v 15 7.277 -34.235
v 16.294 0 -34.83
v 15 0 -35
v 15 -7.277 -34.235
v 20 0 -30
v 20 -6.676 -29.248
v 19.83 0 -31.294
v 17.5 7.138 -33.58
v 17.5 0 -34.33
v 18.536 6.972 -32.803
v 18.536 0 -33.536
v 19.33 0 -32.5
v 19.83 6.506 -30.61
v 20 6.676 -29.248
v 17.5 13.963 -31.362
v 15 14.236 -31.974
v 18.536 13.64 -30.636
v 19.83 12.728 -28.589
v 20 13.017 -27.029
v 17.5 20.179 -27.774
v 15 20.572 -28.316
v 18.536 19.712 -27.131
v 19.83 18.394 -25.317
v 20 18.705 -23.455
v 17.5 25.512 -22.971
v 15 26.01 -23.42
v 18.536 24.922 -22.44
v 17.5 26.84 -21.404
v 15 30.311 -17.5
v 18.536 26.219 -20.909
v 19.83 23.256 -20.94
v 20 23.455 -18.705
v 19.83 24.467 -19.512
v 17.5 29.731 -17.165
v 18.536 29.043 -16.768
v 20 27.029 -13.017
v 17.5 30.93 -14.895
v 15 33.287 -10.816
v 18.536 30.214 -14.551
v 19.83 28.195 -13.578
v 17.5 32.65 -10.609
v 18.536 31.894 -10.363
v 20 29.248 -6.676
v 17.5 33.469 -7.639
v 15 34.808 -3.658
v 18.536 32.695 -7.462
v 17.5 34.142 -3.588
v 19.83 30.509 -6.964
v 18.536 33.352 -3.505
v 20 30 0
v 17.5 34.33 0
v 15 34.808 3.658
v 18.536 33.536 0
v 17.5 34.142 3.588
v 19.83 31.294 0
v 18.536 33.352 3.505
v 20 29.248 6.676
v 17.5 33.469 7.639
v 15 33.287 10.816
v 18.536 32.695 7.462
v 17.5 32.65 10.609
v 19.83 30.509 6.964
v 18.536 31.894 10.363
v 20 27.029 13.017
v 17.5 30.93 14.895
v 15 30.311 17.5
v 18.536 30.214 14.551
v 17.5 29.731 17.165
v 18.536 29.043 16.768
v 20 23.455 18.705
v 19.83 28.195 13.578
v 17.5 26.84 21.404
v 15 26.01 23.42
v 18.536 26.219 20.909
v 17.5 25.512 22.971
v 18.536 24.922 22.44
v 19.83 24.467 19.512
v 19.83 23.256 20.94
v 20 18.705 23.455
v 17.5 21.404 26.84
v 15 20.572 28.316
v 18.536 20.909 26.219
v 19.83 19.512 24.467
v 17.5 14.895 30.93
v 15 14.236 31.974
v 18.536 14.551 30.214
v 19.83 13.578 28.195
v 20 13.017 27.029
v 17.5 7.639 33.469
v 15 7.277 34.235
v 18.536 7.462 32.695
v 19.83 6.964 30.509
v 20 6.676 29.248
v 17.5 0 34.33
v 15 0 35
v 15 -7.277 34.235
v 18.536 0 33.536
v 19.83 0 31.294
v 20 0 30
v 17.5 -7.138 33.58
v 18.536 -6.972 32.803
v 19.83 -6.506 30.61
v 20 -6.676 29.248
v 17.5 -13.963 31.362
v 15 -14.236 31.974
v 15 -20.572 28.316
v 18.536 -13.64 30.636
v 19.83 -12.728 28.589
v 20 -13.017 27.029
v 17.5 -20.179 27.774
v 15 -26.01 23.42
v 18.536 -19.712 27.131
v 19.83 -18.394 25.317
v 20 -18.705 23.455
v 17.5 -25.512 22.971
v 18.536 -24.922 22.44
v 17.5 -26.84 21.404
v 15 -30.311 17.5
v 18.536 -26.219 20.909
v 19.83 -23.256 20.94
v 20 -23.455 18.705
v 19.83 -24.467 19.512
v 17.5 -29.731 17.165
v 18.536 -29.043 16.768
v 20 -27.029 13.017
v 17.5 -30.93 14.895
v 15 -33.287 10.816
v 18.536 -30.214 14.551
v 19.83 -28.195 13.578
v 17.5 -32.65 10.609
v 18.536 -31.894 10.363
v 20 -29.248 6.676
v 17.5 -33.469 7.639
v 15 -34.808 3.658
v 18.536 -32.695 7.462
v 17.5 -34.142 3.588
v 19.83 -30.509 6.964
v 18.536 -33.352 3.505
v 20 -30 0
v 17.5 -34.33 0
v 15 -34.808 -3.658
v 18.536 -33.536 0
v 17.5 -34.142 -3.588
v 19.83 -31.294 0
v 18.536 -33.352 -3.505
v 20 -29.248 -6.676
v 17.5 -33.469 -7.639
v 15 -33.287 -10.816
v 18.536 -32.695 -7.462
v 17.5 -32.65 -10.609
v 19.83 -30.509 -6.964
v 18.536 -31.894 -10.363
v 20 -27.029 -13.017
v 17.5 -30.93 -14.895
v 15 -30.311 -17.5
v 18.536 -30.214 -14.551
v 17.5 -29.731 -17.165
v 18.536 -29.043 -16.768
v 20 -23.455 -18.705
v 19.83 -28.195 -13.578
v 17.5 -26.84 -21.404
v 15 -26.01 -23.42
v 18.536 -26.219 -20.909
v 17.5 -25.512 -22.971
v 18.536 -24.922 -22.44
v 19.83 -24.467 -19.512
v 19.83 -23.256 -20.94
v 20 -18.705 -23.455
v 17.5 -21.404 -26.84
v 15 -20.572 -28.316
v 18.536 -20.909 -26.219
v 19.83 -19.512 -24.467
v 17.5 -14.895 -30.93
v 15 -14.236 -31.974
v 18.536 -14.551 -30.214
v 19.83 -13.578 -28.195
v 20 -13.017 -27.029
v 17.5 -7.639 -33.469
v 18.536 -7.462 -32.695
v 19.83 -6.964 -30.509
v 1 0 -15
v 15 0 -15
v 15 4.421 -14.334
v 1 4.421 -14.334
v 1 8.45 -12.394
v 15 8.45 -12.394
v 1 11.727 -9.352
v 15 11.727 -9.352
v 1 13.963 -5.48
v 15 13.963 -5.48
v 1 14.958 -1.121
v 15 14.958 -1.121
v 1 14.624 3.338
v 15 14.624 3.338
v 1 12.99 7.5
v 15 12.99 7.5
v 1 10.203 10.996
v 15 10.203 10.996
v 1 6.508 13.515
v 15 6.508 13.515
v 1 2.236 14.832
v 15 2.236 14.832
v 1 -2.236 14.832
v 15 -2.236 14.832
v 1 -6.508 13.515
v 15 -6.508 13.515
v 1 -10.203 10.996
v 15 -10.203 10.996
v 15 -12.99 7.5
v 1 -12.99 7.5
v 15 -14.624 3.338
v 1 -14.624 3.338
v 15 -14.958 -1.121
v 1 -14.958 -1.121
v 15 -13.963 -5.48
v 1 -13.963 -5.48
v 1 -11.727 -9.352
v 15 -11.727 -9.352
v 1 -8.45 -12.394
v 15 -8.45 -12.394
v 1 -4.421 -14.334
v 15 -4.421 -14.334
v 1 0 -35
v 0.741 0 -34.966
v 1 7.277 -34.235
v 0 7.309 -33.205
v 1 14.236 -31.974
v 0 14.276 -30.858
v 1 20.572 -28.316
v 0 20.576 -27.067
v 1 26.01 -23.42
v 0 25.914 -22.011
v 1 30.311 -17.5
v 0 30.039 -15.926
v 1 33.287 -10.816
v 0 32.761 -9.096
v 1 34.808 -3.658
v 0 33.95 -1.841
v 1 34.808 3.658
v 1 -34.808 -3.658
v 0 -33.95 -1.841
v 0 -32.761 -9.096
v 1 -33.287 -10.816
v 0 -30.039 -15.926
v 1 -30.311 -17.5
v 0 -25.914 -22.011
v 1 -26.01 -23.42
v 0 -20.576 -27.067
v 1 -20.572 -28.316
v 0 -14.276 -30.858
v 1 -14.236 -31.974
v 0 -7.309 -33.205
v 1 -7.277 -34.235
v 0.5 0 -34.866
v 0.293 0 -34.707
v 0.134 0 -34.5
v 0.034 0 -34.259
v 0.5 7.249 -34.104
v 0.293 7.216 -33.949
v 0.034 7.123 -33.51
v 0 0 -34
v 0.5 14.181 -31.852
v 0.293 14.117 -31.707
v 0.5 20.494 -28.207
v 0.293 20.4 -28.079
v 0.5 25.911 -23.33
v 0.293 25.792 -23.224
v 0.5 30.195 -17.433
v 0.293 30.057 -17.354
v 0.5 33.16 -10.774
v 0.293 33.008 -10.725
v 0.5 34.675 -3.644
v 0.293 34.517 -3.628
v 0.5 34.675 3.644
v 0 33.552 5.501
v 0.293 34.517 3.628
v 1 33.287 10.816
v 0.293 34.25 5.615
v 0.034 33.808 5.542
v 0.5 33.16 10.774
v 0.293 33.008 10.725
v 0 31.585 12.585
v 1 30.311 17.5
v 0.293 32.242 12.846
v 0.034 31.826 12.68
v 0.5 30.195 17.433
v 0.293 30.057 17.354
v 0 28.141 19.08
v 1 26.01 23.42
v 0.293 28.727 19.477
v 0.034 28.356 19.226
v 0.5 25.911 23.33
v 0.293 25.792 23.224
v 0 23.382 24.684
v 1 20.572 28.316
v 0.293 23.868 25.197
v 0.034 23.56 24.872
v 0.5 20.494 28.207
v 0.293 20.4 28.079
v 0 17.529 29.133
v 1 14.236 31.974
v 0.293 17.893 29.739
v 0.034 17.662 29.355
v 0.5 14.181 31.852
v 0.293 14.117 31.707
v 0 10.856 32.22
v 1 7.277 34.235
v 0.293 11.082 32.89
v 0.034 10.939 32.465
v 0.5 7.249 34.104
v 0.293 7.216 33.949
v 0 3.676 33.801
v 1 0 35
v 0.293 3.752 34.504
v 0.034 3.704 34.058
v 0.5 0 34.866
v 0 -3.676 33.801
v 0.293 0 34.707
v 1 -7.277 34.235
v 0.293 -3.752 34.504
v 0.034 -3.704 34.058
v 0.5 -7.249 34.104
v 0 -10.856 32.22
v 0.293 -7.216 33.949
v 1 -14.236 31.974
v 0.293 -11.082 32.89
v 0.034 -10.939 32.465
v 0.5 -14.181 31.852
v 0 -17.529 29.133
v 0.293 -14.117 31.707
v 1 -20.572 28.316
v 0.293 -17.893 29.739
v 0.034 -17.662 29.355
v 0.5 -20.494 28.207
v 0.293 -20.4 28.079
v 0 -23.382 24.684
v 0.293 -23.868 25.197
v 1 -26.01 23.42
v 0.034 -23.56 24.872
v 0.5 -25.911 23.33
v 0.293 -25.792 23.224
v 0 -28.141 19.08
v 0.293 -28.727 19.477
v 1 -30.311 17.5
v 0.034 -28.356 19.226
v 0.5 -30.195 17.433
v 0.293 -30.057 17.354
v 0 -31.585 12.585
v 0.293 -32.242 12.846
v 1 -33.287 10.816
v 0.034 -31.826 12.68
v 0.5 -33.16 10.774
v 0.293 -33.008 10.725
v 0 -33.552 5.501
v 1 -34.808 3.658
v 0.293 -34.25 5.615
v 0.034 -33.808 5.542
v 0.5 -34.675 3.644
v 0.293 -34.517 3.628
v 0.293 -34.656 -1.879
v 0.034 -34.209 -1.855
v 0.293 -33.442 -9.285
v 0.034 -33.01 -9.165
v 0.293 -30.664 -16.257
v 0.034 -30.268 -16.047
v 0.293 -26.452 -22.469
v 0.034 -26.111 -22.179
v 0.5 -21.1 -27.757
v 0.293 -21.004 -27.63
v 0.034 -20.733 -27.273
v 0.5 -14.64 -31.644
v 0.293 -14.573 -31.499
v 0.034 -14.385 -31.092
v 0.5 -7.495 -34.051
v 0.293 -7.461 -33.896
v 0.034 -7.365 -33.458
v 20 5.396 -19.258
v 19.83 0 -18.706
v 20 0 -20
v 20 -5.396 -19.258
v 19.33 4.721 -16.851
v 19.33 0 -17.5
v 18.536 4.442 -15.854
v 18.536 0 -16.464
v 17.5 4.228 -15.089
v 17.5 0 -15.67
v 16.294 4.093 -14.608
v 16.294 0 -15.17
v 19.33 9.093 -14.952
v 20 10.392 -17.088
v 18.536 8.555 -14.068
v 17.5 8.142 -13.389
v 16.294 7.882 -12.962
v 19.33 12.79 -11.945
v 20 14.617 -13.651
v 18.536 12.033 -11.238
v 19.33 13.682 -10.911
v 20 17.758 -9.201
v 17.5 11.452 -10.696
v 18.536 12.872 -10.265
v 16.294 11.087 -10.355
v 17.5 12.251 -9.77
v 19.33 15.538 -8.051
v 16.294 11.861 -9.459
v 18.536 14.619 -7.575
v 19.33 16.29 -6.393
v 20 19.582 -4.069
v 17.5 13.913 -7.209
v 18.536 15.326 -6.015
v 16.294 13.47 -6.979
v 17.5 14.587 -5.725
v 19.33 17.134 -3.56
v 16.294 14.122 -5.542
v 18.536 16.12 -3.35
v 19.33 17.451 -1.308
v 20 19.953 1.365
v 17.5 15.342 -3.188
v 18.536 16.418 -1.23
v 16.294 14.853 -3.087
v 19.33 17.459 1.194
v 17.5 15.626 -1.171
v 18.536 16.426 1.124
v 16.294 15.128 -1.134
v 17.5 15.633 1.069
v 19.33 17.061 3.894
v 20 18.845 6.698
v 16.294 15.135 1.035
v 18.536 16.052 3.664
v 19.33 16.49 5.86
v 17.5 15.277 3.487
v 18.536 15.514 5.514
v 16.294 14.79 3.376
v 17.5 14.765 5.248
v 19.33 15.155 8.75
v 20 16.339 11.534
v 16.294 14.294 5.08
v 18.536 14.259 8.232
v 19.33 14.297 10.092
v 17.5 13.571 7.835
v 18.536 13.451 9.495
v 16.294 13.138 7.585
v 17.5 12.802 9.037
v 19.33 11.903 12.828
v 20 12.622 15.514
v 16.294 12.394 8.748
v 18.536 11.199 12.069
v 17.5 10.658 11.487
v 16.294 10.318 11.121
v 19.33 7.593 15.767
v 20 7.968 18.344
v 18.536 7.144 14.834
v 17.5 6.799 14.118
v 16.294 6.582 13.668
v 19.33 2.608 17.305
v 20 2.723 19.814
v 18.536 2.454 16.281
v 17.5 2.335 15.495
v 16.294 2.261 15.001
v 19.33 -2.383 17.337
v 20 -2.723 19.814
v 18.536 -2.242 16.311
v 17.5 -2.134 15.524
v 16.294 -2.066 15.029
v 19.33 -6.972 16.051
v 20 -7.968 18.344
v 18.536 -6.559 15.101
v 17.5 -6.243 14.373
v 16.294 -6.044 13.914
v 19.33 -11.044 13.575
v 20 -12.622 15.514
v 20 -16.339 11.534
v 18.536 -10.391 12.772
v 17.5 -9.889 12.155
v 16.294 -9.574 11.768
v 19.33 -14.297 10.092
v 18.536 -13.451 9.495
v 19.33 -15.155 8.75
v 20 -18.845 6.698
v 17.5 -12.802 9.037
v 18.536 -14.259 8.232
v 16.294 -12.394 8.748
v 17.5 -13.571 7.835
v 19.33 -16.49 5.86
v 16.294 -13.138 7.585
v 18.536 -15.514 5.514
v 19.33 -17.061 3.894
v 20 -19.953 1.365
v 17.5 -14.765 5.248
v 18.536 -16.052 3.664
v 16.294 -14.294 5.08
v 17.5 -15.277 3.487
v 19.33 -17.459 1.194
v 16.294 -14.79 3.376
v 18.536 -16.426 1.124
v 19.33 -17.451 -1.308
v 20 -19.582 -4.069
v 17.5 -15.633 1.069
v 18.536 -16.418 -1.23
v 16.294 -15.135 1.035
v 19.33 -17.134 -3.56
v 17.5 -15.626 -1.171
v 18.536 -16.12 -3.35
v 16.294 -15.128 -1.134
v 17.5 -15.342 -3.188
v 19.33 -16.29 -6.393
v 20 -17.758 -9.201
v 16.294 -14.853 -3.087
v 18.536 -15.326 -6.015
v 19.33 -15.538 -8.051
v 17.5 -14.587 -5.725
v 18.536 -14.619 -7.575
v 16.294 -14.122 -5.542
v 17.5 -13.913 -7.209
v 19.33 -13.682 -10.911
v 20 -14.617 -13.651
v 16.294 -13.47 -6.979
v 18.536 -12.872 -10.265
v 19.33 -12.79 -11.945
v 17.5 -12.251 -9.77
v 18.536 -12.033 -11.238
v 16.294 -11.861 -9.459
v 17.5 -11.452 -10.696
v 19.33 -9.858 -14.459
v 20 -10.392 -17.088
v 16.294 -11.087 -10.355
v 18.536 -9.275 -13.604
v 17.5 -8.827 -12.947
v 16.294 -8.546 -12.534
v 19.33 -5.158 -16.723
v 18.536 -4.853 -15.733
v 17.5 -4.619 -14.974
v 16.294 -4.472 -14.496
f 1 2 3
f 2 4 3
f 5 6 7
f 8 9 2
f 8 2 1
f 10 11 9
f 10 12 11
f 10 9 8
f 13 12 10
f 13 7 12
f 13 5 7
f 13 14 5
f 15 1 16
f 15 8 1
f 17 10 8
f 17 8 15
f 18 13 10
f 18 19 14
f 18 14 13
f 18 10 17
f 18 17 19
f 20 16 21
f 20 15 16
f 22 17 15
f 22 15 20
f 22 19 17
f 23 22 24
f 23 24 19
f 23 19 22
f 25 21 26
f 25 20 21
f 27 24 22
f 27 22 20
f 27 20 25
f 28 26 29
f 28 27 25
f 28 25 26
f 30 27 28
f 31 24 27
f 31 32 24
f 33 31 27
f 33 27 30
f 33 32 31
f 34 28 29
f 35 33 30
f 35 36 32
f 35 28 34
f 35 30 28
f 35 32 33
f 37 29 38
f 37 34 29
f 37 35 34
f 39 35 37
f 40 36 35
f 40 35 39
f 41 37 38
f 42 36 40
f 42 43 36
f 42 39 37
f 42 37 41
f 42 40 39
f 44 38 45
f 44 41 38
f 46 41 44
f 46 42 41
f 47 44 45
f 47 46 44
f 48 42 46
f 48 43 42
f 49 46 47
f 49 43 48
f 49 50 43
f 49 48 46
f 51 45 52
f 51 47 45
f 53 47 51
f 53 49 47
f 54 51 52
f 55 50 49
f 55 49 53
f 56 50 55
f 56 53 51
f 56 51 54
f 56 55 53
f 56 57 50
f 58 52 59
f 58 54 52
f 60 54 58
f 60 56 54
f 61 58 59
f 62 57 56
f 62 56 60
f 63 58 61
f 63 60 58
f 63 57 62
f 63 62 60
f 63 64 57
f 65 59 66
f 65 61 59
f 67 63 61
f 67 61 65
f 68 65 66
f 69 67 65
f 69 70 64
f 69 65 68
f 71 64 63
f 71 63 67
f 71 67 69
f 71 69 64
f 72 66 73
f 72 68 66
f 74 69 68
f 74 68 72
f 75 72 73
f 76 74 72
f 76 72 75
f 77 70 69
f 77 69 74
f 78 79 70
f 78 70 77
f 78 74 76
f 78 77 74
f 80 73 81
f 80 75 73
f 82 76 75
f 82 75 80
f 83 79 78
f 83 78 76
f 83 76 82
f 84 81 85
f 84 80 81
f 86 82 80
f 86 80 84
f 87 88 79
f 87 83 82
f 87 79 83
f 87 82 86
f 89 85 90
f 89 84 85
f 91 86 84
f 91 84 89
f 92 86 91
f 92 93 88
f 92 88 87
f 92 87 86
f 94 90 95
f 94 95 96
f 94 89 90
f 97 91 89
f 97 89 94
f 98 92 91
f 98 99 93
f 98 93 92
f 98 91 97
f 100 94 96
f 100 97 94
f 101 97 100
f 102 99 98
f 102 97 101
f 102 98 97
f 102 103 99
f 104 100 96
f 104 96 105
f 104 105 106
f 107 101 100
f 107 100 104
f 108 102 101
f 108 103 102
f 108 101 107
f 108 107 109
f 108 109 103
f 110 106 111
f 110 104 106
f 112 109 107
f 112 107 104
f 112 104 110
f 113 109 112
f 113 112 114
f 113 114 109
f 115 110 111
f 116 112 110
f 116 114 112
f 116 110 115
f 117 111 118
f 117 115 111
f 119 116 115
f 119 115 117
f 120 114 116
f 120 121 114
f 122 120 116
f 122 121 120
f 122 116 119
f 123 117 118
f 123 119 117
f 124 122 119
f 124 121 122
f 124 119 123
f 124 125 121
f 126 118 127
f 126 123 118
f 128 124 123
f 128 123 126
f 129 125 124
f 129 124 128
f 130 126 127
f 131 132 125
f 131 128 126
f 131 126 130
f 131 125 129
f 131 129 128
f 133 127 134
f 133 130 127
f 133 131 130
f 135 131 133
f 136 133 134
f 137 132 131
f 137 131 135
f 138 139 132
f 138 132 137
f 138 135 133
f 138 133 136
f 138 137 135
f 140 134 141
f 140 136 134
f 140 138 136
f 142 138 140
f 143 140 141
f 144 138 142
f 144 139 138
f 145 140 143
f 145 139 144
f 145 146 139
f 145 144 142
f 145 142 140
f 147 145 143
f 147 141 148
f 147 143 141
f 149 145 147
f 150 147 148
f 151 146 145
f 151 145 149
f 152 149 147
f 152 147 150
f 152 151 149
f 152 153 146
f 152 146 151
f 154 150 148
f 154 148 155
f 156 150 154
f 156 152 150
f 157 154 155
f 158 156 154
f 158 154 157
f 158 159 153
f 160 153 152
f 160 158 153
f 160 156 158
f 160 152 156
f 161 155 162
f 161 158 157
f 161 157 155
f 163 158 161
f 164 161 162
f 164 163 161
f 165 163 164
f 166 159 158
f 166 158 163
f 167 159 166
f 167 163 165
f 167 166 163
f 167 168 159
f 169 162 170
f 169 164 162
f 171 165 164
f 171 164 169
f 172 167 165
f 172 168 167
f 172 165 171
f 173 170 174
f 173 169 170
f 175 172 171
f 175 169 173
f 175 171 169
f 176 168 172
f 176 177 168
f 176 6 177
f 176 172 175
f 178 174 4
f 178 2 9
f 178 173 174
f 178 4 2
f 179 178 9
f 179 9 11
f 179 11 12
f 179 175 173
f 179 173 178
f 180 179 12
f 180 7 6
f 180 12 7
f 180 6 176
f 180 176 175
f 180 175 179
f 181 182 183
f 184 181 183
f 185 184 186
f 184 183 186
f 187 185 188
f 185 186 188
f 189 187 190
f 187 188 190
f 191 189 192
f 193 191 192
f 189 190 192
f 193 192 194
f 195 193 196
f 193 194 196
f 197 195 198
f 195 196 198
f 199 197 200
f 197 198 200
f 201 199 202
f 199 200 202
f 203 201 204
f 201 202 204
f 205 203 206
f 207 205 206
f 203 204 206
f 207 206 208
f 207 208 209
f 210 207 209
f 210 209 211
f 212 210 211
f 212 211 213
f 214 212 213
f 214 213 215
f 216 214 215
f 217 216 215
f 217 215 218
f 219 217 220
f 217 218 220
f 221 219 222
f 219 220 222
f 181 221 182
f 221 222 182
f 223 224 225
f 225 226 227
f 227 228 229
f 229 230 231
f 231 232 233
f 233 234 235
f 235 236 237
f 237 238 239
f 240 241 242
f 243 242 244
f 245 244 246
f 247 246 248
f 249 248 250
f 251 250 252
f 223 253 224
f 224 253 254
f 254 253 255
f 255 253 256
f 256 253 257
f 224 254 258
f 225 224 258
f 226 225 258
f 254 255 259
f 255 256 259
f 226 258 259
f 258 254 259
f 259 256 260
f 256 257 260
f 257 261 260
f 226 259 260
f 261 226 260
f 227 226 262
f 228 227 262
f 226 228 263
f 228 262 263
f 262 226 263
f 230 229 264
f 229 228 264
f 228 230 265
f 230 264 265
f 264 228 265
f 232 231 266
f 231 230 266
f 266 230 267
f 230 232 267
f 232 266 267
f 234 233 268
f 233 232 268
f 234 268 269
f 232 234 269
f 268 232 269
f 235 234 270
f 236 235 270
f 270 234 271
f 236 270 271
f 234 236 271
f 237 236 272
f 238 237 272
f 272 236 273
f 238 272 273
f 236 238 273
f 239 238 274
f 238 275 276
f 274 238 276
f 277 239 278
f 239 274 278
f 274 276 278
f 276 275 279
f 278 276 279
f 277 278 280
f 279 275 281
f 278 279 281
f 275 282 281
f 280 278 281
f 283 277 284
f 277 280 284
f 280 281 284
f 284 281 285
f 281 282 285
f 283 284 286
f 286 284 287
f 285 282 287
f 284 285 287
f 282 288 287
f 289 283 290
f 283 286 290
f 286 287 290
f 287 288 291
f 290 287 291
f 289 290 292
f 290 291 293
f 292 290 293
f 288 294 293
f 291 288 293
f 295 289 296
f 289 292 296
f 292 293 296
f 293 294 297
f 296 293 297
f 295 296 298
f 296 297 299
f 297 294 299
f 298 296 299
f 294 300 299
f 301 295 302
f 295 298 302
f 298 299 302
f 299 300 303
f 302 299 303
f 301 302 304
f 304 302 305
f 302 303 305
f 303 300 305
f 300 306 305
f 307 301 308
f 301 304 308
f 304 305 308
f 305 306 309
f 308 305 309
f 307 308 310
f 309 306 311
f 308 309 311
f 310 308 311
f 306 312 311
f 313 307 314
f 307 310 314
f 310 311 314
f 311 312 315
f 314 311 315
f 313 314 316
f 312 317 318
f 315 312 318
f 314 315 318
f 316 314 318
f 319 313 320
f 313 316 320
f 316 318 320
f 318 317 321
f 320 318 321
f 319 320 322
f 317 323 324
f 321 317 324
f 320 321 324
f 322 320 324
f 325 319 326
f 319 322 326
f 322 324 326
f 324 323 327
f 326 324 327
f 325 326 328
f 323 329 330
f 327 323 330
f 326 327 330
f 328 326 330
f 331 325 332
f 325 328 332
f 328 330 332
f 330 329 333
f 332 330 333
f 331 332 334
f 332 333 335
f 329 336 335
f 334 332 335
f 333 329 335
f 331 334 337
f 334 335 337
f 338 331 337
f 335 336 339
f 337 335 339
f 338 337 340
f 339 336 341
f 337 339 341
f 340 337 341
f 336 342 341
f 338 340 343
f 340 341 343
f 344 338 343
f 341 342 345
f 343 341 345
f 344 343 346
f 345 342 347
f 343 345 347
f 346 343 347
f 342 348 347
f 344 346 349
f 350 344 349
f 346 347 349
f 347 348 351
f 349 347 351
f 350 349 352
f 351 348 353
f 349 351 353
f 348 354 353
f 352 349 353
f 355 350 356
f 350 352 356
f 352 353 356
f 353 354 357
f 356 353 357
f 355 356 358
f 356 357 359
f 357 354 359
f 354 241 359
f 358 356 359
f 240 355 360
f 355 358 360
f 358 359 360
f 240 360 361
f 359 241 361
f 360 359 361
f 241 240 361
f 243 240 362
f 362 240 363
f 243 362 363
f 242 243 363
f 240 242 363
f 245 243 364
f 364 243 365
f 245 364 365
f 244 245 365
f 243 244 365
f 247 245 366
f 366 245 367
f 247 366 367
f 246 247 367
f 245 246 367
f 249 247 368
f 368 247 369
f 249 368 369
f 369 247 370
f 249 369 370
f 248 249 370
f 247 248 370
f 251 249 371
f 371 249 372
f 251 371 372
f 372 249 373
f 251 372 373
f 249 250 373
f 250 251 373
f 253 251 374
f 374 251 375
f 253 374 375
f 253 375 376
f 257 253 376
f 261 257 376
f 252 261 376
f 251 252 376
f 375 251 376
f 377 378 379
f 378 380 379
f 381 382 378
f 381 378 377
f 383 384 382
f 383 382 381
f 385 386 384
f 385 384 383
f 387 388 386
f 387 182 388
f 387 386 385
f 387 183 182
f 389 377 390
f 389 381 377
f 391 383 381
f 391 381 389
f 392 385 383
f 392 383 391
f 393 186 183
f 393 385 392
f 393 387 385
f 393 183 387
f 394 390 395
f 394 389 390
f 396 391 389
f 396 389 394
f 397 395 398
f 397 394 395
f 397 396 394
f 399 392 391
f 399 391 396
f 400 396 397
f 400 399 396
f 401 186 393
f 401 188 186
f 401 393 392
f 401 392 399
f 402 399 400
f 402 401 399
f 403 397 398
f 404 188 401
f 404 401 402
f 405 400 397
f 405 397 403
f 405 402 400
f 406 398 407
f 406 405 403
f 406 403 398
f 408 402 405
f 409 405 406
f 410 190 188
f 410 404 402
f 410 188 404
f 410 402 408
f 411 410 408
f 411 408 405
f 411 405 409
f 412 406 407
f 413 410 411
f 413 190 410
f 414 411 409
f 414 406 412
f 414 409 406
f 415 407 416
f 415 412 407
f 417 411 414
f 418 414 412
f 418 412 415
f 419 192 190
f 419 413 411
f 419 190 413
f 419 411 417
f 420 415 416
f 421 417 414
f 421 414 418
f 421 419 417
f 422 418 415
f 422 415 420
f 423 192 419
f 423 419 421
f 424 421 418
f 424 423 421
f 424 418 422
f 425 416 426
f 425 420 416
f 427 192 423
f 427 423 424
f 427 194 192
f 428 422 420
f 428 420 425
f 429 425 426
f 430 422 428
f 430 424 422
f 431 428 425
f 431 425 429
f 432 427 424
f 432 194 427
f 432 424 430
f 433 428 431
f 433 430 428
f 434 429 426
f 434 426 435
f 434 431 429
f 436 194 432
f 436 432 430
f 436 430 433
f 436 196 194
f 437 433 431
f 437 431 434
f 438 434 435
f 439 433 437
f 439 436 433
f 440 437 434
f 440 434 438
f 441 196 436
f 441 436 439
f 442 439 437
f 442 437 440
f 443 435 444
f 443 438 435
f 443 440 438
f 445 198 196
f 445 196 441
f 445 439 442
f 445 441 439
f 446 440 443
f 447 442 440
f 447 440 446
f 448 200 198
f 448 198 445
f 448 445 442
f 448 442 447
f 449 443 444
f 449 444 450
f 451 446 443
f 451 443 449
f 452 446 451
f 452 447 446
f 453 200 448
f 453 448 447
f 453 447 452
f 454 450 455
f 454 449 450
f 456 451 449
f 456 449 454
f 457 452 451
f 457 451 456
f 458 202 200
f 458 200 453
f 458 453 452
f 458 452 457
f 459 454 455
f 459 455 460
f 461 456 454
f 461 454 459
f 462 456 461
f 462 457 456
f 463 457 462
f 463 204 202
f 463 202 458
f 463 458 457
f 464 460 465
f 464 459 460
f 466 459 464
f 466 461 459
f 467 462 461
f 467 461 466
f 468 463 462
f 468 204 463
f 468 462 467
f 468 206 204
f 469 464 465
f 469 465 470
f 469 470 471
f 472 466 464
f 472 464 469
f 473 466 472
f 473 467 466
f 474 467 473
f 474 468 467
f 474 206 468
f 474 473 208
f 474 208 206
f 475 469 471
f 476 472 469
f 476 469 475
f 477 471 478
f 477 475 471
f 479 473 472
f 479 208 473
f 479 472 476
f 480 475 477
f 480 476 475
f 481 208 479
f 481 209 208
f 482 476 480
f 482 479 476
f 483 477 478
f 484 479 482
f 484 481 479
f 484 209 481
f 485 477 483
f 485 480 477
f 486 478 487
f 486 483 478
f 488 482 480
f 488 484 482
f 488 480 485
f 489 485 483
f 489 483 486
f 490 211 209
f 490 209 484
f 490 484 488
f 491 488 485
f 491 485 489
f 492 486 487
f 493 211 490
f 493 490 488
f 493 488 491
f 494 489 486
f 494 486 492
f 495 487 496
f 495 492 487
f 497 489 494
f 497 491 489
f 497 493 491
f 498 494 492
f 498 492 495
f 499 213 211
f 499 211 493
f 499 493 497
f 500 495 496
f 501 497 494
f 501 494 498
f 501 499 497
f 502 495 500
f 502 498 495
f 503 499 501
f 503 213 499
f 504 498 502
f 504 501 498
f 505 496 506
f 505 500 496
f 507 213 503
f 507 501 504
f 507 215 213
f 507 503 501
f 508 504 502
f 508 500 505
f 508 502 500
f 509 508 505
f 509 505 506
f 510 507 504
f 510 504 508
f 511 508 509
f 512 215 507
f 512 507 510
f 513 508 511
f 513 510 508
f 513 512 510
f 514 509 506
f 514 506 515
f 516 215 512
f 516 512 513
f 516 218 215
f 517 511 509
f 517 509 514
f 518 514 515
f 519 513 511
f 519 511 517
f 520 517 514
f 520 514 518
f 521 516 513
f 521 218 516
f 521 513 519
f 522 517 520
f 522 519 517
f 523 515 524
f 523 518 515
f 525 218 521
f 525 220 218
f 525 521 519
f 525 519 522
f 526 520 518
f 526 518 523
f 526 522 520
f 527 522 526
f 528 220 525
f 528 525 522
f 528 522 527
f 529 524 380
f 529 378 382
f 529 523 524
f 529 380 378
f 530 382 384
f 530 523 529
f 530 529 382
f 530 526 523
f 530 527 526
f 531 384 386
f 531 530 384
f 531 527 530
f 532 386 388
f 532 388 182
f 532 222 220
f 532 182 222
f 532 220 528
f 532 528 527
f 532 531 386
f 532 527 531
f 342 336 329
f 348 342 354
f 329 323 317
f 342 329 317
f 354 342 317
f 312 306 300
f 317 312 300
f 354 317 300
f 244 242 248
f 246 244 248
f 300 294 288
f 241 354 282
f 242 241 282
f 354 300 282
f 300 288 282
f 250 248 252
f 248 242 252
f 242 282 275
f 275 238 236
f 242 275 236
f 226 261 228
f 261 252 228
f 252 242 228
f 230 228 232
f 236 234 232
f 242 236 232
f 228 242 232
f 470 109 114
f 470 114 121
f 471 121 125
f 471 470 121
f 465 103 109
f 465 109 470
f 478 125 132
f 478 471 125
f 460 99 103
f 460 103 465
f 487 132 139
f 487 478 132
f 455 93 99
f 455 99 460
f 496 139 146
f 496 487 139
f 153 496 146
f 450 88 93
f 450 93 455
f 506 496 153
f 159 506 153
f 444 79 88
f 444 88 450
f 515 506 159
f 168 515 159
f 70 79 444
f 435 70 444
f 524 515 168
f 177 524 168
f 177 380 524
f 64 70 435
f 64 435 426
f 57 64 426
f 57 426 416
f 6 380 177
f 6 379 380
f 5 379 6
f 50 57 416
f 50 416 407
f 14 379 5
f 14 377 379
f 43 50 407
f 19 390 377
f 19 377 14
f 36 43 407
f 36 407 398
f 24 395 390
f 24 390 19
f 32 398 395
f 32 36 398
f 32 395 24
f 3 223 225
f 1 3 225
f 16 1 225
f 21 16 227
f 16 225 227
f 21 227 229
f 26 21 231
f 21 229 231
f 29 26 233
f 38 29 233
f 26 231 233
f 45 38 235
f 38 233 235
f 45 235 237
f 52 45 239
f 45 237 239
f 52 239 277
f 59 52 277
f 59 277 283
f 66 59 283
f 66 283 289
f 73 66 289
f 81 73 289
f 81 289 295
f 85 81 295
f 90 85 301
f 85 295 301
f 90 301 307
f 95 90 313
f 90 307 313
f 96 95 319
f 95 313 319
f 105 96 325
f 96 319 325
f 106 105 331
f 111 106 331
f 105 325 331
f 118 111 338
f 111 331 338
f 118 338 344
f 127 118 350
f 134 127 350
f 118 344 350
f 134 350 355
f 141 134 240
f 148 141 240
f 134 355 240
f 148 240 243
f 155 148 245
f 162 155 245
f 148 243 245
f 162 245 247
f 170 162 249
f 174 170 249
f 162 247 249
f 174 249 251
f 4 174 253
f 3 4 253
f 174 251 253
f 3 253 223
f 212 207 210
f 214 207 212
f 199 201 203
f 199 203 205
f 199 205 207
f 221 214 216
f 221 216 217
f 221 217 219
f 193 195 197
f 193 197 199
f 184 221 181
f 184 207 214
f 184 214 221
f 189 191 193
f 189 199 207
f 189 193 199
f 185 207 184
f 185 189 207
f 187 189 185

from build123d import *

# Parameters (mm, degrees)
SKETCH1_R           = 35
BOSS_EXTRUDE1_DEPTH = 20
SKETCH2_R           = 15
CUT_EXTRUDE1_DEPTH  = 19
FILLET1_R           = 5
FILLET2_R           = 1


with BuildPart() as part:
    # Sketch1 → Boss-Extrude1 (new body)
    with BuildSketch(Plane(origin=(0, 0, 0), x_dir=(0, 0, -1), z_dir=(1, 0, 0))):
        Circle(SKETCH1_R)
    extrude(amount=BOSS_EXTRUDE1_DEPTH)

    # Sketch2 → Cut-Extrude1 (cut)
    with BuildSketch(Plane(origin=(20, 0, 0), x_dir=(0, 0, -1), z_dir=(1, 0, 0))):
        Circle(SKETCH2_R)
    extrude(amount=-CUT_EXTRUDE1_DEPTH, mode=Mode.SUBTRACT)

    # Fillet1
    fillet1_edges = [part.edges().sort_by_distance(p)[0] for p in [
        (20, 0, 35),
        (20, 0, 15),
    ]]
    fillet(fillet1_edges, radius=FILLET1_R)

    # Fillet2
    fillet2_edges = [part.edges().sort_by_distance(p)[0] for p in [
        (0, 0, 35),
    ]]
    fillet(fillet2_edges, radius=FILLET2_R)


solid = part.part
